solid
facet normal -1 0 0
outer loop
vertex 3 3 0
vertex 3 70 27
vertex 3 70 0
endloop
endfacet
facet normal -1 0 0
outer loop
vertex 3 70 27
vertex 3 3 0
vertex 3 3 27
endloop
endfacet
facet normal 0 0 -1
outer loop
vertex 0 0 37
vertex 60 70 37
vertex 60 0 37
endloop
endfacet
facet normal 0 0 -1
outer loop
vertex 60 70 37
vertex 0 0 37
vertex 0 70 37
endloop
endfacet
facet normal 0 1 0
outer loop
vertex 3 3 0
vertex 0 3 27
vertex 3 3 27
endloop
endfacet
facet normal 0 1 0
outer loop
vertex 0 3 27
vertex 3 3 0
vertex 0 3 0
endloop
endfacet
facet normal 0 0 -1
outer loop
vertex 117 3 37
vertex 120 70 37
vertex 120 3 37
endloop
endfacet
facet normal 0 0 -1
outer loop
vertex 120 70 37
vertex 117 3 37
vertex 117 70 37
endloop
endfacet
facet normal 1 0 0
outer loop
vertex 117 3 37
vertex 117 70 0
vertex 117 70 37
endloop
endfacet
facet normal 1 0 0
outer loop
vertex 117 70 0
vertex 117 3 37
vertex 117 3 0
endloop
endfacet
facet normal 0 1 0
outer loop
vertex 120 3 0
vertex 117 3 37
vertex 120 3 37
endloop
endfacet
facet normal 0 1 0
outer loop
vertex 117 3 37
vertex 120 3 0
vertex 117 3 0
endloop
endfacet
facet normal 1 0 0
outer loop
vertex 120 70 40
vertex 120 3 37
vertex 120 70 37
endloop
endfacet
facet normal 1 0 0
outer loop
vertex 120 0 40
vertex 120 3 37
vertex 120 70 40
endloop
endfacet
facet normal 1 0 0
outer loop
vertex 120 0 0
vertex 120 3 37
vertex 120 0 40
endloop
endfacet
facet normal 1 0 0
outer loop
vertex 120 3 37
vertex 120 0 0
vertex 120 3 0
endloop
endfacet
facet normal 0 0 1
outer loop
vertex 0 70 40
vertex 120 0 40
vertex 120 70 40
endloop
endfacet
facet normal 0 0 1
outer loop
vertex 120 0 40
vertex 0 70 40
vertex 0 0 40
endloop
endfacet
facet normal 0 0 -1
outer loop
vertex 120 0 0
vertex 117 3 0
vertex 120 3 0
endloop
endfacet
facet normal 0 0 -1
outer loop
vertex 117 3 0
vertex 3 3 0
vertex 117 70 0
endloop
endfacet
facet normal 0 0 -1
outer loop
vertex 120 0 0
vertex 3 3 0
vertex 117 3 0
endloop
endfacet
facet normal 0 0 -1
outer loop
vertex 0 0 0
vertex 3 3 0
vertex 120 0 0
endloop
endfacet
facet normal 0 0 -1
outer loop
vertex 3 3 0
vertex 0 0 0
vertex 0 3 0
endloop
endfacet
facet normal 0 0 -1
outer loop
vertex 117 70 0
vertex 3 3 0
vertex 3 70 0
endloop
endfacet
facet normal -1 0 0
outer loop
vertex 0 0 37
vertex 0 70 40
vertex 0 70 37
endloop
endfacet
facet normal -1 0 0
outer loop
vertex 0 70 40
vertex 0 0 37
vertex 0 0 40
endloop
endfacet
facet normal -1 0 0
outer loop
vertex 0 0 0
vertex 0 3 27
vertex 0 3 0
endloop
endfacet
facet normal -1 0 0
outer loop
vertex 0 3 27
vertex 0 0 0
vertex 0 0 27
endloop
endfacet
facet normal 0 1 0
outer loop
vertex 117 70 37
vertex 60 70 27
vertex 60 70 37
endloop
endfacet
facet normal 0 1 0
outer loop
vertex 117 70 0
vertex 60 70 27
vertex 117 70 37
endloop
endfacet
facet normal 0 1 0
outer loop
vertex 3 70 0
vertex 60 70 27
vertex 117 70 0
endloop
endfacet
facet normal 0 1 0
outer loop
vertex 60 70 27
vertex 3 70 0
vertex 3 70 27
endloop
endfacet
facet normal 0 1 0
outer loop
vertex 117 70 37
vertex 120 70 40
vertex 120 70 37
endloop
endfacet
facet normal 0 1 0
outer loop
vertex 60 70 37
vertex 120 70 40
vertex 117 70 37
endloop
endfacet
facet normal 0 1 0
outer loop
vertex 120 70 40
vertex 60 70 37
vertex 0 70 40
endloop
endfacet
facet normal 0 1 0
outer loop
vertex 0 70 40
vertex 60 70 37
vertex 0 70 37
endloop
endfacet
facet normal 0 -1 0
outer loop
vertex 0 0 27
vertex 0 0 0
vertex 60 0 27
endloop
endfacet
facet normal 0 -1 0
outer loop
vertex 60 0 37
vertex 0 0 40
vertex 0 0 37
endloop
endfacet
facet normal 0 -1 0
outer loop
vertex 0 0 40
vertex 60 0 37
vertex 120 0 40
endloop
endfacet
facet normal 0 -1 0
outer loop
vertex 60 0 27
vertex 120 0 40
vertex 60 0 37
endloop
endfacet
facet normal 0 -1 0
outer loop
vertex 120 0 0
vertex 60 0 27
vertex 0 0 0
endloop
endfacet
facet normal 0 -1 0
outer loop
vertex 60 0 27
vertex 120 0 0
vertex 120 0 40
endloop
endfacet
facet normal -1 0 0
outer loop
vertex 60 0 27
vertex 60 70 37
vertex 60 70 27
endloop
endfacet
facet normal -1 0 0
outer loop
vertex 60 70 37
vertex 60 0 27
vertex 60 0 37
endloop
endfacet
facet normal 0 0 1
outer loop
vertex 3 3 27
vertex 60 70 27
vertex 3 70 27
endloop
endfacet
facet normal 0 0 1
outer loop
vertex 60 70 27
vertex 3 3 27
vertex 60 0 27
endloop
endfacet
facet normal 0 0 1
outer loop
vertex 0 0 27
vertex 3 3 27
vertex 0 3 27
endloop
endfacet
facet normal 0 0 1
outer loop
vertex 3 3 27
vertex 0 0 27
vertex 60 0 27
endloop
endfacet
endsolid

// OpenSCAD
// OpenSCAD file - a reservoir tank for a horizontal gel electrophoresis box. NOVEL part
// (an open-top rectangular tank with a raised central platform that splits the bottom into two
// buffer chambers that connect above the platform, with horizontal electrode holes through the
// end walls). Deliberately not one of the 16 benchmark tasks - a general lab part.
//

tank_L = 120;
tank_W = 70;
tank_H = 40;
wall   = 3;
floor  = 3;
platform_L = 60;
platform_h = 10;
electrode_d = 2;

$fn = 48;

inner_w = tank_W - 2 * wall;
inner_h = tank_H - floor;

difference() {
    cube([tank_L, tank_W, tank_H]);

    // end walls (open at the top)
    translate([0, wall, 0]) cube([wall, tank_W, tank_H - floor]);
    translate([tank_L - wall, wall, 0]) cube([wall, tank_W, tank_H - floor]);

    // central raised platform, spanning the full width, centred in X
    translate([0, 0, tank_H - floor - platform_h])
        cube([platform_L, tank_W, platform_h]);

    // horizontal electrode hole in each end wall: along X, centred in Y, at z = 30
    for (x = [0, tank_L - wall])
        translate([x, wall, 0])
            difference() {
                cube([wall, tank_W, tank_H - floor]);
                translate([0, wall - electrode_d / 2, 30]) cube([wall, tank_W, electrode_d]);
            }
}
